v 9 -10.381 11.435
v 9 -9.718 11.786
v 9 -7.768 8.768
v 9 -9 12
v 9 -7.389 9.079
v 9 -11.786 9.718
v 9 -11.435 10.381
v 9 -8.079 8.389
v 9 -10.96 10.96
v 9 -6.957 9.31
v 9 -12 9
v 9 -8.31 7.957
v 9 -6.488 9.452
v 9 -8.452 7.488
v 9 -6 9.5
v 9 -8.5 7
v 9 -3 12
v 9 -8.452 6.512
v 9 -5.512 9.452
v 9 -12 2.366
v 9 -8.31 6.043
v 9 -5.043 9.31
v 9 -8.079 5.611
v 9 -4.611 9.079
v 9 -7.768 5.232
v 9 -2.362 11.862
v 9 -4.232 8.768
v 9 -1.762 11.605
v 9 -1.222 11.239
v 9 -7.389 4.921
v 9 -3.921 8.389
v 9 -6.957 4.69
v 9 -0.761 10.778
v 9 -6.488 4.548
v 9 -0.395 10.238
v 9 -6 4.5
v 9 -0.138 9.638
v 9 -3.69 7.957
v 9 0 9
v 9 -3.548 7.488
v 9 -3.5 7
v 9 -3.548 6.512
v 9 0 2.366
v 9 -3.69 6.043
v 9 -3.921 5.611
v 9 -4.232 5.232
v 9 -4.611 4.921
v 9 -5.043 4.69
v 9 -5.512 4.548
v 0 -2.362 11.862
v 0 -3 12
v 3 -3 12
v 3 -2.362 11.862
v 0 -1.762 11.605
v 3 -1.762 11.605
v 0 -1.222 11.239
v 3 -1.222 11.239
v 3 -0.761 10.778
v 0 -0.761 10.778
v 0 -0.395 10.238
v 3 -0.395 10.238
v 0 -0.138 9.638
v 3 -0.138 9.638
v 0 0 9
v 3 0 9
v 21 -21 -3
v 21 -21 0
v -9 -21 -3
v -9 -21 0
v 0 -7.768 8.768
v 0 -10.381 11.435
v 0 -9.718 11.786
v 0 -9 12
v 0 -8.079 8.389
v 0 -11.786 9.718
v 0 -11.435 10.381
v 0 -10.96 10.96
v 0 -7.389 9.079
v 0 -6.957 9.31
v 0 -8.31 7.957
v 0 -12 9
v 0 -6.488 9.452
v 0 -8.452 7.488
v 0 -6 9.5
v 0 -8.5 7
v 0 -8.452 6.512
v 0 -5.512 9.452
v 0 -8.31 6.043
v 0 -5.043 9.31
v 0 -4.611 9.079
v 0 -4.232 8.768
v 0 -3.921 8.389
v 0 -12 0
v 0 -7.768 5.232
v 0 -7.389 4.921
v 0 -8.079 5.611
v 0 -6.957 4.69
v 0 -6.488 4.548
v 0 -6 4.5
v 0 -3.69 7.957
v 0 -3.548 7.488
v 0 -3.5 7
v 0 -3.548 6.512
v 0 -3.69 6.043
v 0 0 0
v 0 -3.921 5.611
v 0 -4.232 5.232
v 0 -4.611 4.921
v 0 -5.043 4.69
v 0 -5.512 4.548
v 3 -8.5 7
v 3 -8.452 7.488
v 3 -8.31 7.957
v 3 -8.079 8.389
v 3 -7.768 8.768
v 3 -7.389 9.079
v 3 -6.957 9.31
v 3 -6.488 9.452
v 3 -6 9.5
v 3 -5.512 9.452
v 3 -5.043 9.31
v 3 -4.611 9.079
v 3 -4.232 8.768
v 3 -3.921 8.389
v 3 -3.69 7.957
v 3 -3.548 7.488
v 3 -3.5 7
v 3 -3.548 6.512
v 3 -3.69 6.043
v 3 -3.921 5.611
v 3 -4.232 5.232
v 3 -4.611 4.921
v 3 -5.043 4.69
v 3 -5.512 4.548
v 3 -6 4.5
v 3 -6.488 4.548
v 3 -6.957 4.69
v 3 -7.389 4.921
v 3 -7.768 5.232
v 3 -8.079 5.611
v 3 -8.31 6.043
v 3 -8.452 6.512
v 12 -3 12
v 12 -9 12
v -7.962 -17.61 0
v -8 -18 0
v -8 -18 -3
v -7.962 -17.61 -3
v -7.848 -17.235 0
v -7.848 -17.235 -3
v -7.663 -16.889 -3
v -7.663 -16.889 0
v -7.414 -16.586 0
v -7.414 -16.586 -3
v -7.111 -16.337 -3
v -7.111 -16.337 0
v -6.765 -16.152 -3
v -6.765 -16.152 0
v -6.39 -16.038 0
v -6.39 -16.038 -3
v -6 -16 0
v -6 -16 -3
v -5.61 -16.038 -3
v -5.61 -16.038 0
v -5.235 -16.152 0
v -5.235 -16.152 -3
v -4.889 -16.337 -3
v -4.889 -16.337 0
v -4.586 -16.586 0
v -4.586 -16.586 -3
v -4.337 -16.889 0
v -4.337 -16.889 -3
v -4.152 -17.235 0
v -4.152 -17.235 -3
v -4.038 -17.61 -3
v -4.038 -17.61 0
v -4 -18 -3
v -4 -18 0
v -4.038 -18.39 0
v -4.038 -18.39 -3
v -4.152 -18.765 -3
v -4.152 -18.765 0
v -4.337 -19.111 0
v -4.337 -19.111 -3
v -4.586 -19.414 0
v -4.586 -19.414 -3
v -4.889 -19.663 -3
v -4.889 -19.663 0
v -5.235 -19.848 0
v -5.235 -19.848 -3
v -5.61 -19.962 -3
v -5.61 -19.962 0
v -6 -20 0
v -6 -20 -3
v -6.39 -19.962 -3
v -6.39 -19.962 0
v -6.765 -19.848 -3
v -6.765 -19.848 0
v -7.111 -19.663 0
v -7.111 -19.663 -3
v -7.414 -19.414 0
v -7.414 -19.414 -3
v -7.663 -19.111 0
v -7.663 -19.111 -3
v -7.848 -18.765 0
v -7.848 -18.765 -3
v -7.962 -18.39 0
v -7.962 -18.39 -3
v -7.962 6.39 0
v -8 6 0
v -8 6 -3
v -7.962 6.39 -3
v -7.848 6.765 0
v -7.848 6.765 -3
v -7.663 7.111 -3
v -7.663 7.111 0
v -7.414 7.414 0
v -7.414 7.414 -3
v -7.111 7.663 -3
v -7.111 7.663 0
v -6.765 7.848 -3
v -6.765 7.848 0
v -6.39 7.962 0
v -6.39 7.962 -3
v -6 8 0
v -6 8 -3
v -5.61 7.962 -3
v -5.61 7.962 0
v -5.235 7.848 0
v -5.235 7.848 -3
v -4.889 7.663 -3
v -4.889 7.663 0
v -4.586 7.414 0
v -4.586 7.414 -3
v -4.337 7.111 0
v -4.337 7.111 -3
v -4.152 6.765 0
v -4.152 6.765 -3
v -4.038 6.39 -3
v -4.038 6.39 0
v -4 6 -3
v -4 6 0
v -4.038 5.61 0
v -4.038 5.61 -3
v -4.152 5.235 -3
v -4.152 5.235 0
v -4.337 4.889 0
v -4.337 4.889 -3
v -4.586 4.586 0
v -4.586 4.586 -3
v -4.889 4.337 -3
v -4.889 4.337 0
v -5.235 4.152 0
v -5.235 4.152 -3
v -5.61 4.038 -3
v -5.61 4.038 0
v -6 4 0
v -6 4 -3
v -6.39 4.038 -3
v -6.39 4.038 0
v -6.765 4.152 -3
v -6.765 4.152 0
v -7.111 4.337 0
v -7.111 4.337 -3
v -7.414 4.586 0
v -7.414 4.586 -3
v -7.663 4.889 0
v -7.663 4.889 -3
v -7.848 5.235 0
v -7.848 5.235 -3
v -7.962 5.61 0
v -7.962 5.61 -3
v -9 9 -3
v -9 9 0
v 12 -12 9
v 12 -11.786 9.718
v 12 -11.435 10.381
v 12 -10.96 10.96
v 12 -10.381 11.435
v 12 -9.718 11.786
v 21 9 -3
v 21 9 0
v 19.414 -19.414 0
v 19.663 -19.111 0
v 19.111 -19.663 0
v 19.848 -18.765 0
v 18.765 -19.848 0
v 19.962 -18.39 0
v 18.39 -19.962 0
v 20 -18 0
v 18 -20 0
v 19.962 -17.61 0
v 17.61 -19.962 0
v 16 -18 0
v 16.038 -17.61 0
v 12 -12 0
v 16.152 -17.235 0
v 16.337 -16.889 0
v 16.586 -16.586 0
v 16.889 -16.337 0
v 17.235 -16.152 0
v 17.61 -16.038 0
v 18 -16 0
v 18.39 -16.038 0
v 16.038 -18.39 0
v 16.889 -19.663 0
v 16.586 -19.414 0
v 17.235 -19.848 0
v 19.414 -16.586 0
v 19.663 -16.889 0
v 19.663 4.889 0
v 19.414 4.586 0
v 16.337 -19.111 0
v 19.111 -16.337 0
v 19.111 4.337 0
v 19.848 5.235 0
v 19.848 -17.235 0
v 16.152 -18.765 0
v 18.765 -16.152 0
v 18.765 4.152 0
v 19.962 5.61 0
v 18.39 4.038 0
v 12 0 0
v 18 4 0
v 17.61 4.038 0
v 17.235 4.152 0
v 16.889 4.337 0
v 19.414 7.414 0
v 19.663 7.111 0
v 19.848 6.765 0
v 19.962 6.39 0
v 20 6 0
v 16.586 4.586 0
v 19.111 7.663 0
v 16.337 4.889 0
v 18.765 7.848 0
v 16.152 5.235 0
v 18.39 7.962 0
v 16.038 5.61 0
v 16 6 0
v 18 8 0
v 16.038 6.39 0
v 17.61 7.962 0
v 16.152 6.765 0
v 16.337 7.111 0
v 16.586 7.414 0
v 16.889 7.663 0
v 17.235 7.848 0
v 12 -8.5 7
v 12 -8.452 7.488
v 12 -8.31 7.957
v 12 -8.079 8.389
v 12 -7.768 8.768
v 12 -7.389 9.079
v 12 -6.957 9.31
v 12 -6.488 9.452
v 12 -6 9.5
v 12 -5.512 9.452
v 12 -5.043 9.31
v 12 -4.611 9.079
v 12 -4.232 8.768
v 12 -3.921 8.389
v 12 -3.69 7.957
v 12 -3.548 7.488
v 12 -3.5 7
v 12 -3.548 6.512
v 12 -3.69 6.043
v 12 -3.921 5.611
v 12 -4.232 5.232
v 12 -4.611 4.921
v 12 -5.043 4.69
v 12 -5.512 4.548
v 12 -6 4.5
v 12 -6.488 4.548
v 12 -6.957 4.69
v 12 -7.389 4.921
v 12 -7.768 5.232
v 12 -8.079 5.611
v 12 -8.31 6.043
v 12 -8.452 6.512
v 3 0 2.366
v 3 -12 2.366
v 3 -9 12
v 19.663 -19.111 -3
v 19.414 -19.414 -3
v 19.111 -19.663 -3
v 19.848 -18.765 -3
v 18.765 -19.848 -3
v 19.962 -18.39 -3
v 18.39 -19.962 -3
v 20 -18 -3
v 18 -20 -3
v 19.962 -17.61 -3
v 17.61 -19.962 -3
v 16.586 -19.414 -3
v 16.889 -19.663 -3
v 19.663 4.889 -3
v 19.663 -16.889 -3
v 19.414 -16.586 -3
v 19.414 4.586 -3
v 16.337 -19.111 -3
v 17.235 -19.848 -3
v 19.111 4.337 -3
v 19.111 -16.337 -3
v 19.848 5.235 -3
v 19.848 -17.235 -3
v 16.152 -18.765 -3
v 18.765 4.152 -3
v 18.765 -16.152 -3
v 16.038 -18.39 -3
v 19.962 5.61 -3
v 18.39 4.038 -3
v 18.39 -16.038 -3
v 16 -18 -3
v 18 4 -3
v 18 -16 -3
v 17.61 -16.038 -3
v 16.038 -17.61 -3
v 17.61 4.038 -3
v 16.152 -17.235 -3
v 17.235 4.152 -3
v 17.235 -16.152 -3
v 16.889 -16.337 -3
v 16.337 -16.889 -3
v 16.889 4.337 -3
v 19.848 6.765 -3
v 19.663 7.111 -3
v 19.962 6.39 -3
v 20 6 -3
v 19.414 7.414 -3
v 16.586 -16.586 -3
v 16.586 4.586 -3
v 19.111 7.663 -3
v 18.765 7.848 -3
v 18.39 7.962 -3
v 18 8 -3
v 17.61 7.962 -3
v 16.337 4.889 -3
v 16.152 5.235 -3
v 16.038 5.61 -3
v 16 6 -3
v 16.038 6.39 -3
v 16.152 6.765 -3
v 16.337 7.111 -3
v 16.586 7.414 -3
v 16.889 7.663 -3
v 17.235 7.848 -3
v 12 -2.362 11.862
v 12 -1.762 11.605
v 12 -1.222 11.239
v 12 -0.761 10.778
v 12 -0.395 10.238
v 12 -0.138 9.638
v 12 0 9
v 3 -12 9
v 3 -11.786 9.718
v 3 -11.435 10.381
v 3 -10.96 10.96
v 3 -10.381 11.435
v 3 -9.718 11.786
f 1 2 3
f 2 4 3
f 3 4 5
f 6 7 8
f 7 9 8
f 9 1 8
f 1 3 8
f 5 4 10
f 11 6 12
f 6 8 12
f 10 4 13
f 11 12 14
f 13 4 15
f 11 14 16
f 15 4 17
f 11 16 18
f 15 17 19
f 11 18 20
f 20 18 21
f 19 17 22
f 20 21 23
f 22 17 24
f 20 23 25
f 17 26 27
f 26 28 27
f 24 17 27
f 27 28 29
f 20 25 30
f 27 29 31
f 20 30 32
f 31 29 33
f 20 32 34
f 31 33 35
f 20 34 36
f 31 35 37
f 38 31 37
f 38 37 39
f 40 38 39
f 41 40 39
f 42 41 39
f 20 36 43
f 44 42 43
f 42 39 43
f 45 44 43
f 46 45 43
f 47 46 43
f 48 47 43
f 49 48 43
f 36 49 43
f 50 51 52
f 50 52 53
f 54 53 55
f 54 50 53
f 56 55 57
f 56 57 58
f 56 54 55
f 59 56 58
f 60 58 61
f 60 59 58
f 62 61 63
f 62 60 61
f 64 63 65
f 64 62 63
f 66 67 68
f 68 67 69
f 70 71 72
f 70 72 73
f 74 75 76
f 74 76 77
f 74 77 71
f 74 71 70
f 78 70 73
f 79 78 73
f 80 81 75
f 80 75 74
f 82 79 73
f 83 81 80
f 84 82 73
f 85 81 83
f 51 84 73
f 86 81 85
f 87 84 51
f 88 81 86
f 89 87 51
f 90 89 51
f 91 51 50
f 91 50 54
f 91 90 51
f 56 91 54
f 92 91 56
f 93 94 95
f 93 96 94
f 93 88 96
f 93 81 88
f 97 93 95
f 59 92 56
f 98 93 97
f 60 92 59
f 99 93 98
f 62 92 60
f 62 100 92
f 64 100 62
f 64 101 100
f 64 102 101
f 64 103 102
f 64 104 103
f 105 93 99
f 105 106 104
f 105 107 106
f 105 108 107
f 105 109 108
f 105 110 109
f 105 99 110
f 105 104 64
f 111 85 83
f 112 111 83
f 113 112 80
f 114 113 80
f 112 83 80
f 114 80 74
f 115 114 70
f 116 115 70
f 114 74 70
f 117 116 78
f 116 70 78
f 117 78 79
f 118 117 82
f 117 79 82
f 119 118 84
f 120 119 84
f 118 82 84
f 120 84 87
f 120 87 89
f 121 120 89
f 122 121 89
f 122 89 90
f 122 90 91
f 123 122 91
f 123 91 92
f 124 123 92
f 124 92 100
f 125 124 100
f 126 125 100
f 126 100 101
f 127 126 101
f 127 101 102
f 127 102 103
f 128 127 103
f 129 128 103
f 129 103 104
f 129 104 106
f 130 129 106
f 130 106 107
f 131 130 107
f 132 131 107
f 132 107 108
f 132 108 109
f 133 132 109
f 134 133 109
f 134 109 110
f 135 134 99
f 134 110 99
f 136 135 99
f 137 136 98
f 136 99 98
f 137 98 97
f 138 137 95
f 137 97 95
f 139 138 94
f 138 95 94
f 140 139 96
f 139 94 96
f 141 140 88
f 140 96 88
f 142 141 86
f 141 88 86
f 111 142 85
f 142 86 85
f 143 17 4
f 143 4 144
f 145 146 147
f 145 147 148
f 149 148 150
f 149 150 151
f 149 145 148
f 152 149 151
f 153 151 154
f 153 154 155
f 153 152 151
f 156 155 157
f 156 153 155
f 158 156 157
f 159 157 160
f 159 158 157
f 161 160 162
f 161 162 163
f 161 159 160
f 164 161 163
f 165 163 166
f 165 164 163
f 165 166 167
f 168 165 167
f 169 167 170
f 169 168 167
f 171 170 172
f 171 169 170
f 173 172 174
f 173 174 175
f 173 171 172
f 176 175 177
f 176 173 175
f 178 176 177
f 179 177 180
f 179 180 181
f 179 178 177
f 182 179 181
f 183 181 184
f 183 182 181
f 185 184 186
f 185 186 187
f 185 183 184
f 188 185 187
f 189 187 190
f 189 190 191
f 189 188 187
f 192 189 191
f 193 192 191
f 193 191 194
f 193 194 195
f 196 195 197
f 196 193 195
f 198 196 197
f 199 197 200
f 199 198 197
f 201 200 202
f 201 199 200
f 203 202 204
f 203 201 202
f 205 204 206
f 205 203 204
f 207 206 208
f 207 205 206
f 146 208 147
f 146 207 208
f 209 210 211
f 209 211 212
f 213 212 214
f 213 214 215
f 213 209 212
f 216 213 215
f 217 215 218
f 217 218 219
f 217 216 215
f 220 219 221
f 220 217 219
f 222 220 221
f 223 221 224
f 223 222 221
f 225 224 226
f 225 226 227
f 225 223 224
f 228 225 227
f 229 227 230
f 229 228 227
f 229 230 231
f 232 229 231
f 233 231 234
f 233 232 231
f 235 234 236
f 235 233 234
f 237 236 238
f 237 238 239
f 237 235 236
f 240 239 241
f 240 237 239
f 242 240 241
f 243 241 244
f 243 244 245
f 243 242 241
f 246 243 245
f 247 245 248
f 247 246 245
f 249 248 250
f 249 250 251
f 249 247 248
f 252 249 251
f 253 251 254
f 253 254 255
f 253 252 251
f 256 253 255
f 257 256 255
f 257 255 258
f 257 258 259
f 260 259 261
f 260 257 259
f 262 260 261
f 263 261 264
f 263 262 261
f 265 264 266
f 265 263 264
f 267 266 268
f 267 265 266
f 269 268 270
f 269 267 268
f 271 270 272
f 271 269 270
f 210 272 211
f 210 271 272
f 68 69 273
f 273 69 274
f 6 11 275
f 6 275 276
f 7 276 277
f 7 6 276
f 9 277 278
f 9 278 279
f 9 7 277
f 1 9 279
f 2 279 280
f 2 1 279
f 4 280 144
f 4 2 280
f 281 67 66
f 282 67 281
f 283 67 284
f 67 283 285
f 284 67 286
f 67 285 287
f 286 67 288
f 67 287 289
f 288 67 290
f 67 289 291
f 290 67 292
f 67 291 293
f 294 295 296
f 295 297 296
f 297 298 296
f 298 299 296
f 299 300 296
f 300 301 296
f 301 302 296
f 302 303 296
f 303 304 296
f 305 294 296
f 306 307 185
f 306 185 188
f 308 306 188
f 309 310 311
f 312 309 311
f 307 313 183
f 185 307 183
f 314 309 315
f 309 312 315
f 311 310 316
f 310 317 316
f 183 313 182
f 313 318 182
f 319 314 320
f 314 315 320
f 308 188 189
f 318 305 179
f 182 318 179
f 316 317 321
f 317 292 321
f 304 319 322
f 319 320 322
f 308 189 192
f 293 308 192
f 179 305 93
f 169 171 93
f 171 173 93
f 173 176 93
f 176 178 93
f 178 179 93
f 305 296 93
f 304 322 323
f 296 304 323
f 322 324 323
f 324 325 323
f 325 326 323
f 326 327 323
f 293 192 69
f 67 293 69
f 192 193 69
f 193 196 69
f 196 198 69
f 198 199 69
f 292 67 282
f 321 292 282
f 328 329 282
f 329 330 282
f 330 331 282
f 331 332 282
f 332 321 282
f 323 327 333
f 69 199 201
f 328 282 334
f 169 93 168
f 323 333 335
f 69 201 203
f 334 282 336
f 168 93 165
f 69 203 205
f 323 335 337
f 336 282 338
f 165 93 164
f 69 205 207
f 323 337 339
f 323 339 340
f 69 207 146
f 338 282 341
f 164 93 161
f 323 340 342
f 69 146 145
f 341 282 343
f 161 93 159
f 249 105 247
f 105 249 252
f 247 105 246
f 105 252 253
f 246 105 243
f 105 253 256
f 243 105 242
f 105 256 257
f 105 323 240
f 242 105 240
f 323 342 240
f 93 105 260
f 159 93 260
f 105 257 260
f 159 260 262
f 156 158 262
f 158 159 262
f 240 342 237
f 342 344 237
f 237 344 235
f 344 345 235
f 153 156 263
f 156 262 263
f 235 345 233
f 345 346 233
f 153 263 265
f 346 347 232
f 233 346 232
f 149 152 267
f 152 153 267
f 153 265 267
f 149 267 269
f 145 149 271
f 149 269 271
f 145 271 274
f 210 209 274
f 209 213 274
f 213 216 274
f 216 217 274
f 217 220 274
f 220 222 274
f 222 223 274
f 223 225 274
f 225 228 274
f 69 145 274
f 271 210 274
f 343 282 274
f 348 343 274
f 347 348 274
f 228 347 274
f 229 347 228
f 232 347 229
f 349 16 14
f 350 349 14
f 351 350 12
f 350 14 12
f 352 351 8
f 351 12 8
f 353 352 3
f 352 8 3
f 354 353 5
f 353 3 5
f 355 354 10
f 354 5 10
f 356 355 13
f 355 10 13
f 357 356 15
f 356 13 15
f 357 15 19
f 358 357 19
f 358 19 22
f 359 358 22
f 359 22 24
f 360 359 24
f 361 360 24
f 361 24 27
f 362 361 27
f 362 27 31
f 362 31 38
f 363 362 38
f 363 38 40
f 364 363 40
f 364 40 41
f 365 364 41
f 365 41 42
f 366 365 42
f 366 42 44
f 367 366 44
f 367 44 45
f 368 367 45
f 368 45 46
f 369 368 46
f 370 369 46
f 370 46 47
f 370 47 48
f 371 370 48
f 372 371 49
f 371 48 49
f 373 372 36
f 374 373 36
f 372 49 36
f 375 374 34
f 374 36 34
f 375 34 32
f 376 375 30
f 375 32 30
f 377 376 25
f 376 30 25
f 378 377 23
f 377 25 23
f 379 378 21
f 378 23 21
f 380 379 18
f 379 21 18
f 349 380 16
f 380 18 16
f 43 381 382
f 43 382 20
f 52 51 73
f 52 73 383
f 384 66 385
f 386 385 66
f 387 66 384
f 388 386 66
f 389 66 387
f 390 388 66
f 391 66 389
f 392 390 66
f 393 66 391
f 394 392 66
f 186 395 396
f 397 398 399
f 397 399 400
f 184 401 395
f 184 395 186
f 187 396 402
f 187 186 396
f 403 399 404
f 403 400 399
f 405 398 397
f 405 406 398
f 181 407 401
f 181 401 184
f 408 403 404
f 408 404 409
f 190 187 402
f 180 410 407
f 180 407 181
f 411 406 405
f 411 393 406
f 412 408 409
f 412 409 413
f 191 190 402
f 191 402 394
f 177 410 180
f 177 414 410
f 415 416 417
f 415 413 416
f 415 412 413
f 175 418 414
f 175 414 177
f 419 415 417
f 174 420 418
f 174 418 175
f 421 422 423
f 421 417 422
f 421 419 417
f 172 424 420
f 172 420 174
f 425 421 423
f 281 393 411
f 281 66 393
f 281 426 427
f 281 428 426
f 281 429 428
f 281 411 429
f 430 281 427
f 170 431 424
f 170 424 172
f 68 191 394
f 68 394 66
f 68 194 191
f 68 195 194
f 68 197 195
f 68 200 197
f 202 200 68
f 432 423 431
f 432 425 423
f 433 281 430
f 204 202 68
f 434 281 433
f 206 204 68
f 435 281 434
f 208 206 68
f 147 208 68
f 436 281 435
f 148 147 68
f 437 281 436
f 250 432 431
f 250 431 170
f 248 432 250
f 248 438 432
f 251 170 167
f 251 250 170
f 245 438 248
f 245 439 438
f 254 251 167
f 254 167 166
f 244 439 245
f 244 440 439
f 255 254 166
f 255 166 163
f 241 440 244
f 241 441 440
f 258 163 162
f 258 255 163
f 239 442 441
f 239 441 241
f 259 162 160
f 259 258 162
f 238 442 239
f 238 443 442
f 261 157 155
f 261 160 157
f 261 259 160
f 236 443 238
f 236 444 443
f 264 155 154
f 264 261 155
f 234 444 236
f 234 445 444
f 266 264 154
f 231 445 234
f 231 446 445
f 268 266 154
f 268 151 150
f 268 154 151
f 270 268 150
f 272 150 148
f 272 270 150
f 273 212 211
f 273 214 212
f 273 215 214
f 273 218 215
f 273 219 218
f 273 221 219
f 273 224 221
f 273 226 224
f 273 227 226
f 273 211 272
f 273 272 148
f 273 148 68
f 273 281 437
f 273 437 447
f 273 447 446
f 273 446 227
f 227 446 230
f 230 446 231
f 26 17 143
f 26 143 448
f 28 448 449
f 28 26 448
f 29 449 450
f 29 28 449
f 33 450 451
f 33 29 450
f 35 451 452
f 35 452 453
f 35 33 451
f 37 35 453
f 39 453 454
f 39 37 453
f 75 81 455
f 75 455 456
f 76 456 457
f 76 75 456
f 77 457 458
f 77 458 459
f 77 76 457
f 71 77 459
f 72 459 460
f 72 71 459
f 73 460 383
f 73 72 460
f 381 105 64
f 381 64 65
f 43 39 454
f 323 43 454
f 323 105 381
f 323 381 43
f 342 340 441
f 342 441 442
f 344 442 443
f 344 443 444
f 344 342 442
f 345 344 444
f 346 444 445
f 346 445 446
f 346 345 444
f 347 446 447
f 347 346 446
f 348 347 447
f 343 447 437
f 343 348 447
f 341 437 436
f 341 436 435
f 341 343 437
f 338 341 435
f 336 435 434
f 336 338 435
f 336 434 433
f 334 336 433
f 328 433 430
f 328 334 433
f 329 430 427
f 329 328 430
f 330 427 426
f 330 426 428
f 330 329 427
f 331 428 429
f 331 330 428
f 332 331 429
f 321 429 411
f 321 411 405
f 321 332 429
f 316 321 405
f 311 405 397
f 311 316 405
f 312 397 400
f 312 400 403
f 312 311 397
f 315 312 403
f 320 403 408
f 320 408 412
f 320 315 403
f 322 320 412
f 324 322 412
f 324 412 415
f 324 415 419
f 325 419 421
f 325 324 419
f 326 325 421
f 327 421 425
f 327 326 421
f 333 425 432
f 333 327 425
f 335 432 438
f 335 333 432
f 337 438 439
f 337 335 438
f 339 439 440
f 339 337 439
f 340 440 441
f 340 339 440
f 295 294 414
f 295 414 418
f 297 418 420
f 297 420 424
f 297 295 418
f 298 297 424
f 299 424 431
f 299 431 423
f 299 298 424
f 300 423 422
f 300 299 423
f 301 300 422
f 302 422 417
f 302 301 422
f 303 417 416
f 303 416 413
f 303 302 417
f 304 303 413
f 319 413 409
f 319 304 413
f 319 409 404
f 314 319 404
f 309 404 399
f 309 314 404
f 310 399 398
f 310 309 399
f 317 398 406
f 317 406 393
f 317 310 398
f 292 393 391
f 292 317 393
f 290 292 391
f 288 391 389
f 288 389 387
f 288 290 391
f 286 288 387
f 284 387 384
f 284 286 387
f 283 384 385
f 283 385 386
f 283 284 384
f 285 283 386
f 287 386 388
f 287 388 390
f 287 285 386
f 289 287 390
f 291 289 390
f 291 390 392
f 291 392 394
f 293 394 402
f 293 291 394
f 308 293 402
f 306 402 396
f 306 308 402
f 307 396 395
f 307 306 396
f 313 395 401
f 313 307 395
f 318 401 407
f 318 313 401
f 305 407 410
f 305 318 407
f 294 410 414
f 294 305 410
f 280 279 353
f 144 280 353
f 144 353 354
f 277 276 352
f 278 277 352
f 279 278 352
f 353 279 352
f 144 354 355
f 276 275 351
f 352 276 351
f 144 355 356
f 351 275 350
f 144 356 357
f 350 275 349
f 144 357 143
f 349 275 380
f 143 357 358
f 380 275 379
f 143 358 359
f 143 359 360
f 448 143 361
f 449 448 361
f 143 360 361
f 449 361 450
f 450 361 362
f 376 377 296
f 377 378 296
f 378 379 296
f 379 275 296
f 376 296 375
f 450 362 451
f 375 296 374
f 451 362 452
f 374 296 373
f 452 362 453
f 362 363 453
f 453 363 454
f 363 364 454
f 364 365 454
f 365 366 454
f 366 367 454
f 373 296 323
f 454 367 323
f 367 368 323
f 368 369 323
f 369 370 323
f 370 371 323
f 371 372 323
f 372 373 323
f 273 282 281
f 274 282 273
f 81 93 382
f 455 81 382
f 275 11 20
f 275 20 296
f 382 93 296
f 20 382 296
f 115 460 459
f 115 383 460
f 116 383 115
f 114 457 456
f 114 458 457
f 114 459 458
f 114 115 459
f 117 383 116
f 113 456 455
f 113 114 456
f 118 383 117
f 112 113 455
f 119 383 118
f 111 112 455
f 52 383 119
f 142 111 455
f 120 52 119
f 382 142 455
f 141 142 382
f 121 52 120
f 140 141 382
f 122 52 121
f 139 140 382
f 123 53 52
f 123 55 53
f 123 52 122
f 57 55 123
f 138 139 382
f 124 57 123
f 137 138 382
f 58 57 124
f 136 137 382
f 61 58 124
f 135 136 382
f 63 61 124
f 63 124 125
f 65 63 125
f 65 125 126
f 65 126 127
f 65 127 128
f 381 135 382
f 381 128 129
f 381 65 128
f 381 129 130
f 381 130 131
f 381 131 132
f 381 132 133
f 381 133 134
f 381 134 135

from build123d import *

# Parameters (mm, degrees)
ESQUISSE1_W             = 12
ESQUISSE1_H             = 12
BOSS_EXTRU_1_DEPTH      = 12
ESQUISSE2_W             = 6
ESQUISSE2_H             = 9.63415441
ENL_V_MAT_EXTRU_1_DEPTH = 21.784609691
ESQUISSE3_R             = 2.5
ENL_V_MAT_EXTRU_2_DEPTH = 21.784609691
ESQUISSE4_W             = 30
ESQUISSE4_H             = 30
ESQUISSE4_R             = 2
BOSS_EXTRU_2_DEPTH      = 3


with BuildPart() as part:
    # Esquisse1 → Boss.-Extru.1 (new body)
    with BuildSketch(Plane.XY):
        with Locations((6, -6)):
            Rectangle(ESQUISSE1_W, ESQUISSE1_H)
    extrude(amount=BOSS_EXTRU_1_DEPTH)

    # Esquisse2 → Enlèv. mat.-Extru.1 (cut, through all)
    with BuildSketch(Plane(origin=(0, 0, 0), x_dir=(1, 0, 0), z_dir=(0, 1, 0))):
        with Locations((6, -7.182922795)):
            Rectangle(ESQUISSE2_W, ESQUISSE2_H)
    extrude(amount=-ENL_V_MAT_EXTRU_1_DEPTH, mode=Mode.SUBTRACT)

    # Esquisse3 → Enlèv. mat.-Extru.2 (cut, through all)
    with BuildSketch(Plane.ZY):
        with Locations(Location((7, -6, 0), (0, 0, 270))):
            Circle(ESQUISSE3_R)
        with BuildLine():
            Line((12, -12), (9, -12))
            ThreePointArc((9, -12), (10.960425347, -10.960425347), (12, -9))
            Line((12, -9), (12, -12))
        make_face()
        with BuildLine():
            Line((12, 0), (12, -3))
            ThreePointArc((12, -3), (11.019761374, -0.980238626), (9, 0))
            Line((9, 0), (12, 0))
        make_face()
    extrude(amount=-ENL_V_MAT_EXTRU_2_DEPTH, mode=Mode.SUBTRACT)

    # Esquisse4 → Boss.-Extru.2 (add)
    with BuildSketch(Plane(origin=(0, 0, 0), x_dir=(-1, 0, 0), z_dir=(0, 0, -1))):
        with Locations((-6, -6)):
            Rectangle(ESQUISSE4_W, ESQUISSE4_H)
        with Locations((-18, 6)):
            Circle(ESQUISSE4_R, mode=Mode.SUBTRACT)
        with Locations((6, 6)):
            Circle(ESQUISSE4_R, mode=Mode.SUBTRACT)
        with Locations((-18, -18)):
            Circle(ESQUISSE4_R, mode=Mode.SUBTRACT)
        with Locations((6, -18)):
            Circle(ESQUISSE4_R, mode=Mode.SUBTRACT)
    extrude(amount=BOSS_EXTRU_2_DEPTH)


solid = part.part
